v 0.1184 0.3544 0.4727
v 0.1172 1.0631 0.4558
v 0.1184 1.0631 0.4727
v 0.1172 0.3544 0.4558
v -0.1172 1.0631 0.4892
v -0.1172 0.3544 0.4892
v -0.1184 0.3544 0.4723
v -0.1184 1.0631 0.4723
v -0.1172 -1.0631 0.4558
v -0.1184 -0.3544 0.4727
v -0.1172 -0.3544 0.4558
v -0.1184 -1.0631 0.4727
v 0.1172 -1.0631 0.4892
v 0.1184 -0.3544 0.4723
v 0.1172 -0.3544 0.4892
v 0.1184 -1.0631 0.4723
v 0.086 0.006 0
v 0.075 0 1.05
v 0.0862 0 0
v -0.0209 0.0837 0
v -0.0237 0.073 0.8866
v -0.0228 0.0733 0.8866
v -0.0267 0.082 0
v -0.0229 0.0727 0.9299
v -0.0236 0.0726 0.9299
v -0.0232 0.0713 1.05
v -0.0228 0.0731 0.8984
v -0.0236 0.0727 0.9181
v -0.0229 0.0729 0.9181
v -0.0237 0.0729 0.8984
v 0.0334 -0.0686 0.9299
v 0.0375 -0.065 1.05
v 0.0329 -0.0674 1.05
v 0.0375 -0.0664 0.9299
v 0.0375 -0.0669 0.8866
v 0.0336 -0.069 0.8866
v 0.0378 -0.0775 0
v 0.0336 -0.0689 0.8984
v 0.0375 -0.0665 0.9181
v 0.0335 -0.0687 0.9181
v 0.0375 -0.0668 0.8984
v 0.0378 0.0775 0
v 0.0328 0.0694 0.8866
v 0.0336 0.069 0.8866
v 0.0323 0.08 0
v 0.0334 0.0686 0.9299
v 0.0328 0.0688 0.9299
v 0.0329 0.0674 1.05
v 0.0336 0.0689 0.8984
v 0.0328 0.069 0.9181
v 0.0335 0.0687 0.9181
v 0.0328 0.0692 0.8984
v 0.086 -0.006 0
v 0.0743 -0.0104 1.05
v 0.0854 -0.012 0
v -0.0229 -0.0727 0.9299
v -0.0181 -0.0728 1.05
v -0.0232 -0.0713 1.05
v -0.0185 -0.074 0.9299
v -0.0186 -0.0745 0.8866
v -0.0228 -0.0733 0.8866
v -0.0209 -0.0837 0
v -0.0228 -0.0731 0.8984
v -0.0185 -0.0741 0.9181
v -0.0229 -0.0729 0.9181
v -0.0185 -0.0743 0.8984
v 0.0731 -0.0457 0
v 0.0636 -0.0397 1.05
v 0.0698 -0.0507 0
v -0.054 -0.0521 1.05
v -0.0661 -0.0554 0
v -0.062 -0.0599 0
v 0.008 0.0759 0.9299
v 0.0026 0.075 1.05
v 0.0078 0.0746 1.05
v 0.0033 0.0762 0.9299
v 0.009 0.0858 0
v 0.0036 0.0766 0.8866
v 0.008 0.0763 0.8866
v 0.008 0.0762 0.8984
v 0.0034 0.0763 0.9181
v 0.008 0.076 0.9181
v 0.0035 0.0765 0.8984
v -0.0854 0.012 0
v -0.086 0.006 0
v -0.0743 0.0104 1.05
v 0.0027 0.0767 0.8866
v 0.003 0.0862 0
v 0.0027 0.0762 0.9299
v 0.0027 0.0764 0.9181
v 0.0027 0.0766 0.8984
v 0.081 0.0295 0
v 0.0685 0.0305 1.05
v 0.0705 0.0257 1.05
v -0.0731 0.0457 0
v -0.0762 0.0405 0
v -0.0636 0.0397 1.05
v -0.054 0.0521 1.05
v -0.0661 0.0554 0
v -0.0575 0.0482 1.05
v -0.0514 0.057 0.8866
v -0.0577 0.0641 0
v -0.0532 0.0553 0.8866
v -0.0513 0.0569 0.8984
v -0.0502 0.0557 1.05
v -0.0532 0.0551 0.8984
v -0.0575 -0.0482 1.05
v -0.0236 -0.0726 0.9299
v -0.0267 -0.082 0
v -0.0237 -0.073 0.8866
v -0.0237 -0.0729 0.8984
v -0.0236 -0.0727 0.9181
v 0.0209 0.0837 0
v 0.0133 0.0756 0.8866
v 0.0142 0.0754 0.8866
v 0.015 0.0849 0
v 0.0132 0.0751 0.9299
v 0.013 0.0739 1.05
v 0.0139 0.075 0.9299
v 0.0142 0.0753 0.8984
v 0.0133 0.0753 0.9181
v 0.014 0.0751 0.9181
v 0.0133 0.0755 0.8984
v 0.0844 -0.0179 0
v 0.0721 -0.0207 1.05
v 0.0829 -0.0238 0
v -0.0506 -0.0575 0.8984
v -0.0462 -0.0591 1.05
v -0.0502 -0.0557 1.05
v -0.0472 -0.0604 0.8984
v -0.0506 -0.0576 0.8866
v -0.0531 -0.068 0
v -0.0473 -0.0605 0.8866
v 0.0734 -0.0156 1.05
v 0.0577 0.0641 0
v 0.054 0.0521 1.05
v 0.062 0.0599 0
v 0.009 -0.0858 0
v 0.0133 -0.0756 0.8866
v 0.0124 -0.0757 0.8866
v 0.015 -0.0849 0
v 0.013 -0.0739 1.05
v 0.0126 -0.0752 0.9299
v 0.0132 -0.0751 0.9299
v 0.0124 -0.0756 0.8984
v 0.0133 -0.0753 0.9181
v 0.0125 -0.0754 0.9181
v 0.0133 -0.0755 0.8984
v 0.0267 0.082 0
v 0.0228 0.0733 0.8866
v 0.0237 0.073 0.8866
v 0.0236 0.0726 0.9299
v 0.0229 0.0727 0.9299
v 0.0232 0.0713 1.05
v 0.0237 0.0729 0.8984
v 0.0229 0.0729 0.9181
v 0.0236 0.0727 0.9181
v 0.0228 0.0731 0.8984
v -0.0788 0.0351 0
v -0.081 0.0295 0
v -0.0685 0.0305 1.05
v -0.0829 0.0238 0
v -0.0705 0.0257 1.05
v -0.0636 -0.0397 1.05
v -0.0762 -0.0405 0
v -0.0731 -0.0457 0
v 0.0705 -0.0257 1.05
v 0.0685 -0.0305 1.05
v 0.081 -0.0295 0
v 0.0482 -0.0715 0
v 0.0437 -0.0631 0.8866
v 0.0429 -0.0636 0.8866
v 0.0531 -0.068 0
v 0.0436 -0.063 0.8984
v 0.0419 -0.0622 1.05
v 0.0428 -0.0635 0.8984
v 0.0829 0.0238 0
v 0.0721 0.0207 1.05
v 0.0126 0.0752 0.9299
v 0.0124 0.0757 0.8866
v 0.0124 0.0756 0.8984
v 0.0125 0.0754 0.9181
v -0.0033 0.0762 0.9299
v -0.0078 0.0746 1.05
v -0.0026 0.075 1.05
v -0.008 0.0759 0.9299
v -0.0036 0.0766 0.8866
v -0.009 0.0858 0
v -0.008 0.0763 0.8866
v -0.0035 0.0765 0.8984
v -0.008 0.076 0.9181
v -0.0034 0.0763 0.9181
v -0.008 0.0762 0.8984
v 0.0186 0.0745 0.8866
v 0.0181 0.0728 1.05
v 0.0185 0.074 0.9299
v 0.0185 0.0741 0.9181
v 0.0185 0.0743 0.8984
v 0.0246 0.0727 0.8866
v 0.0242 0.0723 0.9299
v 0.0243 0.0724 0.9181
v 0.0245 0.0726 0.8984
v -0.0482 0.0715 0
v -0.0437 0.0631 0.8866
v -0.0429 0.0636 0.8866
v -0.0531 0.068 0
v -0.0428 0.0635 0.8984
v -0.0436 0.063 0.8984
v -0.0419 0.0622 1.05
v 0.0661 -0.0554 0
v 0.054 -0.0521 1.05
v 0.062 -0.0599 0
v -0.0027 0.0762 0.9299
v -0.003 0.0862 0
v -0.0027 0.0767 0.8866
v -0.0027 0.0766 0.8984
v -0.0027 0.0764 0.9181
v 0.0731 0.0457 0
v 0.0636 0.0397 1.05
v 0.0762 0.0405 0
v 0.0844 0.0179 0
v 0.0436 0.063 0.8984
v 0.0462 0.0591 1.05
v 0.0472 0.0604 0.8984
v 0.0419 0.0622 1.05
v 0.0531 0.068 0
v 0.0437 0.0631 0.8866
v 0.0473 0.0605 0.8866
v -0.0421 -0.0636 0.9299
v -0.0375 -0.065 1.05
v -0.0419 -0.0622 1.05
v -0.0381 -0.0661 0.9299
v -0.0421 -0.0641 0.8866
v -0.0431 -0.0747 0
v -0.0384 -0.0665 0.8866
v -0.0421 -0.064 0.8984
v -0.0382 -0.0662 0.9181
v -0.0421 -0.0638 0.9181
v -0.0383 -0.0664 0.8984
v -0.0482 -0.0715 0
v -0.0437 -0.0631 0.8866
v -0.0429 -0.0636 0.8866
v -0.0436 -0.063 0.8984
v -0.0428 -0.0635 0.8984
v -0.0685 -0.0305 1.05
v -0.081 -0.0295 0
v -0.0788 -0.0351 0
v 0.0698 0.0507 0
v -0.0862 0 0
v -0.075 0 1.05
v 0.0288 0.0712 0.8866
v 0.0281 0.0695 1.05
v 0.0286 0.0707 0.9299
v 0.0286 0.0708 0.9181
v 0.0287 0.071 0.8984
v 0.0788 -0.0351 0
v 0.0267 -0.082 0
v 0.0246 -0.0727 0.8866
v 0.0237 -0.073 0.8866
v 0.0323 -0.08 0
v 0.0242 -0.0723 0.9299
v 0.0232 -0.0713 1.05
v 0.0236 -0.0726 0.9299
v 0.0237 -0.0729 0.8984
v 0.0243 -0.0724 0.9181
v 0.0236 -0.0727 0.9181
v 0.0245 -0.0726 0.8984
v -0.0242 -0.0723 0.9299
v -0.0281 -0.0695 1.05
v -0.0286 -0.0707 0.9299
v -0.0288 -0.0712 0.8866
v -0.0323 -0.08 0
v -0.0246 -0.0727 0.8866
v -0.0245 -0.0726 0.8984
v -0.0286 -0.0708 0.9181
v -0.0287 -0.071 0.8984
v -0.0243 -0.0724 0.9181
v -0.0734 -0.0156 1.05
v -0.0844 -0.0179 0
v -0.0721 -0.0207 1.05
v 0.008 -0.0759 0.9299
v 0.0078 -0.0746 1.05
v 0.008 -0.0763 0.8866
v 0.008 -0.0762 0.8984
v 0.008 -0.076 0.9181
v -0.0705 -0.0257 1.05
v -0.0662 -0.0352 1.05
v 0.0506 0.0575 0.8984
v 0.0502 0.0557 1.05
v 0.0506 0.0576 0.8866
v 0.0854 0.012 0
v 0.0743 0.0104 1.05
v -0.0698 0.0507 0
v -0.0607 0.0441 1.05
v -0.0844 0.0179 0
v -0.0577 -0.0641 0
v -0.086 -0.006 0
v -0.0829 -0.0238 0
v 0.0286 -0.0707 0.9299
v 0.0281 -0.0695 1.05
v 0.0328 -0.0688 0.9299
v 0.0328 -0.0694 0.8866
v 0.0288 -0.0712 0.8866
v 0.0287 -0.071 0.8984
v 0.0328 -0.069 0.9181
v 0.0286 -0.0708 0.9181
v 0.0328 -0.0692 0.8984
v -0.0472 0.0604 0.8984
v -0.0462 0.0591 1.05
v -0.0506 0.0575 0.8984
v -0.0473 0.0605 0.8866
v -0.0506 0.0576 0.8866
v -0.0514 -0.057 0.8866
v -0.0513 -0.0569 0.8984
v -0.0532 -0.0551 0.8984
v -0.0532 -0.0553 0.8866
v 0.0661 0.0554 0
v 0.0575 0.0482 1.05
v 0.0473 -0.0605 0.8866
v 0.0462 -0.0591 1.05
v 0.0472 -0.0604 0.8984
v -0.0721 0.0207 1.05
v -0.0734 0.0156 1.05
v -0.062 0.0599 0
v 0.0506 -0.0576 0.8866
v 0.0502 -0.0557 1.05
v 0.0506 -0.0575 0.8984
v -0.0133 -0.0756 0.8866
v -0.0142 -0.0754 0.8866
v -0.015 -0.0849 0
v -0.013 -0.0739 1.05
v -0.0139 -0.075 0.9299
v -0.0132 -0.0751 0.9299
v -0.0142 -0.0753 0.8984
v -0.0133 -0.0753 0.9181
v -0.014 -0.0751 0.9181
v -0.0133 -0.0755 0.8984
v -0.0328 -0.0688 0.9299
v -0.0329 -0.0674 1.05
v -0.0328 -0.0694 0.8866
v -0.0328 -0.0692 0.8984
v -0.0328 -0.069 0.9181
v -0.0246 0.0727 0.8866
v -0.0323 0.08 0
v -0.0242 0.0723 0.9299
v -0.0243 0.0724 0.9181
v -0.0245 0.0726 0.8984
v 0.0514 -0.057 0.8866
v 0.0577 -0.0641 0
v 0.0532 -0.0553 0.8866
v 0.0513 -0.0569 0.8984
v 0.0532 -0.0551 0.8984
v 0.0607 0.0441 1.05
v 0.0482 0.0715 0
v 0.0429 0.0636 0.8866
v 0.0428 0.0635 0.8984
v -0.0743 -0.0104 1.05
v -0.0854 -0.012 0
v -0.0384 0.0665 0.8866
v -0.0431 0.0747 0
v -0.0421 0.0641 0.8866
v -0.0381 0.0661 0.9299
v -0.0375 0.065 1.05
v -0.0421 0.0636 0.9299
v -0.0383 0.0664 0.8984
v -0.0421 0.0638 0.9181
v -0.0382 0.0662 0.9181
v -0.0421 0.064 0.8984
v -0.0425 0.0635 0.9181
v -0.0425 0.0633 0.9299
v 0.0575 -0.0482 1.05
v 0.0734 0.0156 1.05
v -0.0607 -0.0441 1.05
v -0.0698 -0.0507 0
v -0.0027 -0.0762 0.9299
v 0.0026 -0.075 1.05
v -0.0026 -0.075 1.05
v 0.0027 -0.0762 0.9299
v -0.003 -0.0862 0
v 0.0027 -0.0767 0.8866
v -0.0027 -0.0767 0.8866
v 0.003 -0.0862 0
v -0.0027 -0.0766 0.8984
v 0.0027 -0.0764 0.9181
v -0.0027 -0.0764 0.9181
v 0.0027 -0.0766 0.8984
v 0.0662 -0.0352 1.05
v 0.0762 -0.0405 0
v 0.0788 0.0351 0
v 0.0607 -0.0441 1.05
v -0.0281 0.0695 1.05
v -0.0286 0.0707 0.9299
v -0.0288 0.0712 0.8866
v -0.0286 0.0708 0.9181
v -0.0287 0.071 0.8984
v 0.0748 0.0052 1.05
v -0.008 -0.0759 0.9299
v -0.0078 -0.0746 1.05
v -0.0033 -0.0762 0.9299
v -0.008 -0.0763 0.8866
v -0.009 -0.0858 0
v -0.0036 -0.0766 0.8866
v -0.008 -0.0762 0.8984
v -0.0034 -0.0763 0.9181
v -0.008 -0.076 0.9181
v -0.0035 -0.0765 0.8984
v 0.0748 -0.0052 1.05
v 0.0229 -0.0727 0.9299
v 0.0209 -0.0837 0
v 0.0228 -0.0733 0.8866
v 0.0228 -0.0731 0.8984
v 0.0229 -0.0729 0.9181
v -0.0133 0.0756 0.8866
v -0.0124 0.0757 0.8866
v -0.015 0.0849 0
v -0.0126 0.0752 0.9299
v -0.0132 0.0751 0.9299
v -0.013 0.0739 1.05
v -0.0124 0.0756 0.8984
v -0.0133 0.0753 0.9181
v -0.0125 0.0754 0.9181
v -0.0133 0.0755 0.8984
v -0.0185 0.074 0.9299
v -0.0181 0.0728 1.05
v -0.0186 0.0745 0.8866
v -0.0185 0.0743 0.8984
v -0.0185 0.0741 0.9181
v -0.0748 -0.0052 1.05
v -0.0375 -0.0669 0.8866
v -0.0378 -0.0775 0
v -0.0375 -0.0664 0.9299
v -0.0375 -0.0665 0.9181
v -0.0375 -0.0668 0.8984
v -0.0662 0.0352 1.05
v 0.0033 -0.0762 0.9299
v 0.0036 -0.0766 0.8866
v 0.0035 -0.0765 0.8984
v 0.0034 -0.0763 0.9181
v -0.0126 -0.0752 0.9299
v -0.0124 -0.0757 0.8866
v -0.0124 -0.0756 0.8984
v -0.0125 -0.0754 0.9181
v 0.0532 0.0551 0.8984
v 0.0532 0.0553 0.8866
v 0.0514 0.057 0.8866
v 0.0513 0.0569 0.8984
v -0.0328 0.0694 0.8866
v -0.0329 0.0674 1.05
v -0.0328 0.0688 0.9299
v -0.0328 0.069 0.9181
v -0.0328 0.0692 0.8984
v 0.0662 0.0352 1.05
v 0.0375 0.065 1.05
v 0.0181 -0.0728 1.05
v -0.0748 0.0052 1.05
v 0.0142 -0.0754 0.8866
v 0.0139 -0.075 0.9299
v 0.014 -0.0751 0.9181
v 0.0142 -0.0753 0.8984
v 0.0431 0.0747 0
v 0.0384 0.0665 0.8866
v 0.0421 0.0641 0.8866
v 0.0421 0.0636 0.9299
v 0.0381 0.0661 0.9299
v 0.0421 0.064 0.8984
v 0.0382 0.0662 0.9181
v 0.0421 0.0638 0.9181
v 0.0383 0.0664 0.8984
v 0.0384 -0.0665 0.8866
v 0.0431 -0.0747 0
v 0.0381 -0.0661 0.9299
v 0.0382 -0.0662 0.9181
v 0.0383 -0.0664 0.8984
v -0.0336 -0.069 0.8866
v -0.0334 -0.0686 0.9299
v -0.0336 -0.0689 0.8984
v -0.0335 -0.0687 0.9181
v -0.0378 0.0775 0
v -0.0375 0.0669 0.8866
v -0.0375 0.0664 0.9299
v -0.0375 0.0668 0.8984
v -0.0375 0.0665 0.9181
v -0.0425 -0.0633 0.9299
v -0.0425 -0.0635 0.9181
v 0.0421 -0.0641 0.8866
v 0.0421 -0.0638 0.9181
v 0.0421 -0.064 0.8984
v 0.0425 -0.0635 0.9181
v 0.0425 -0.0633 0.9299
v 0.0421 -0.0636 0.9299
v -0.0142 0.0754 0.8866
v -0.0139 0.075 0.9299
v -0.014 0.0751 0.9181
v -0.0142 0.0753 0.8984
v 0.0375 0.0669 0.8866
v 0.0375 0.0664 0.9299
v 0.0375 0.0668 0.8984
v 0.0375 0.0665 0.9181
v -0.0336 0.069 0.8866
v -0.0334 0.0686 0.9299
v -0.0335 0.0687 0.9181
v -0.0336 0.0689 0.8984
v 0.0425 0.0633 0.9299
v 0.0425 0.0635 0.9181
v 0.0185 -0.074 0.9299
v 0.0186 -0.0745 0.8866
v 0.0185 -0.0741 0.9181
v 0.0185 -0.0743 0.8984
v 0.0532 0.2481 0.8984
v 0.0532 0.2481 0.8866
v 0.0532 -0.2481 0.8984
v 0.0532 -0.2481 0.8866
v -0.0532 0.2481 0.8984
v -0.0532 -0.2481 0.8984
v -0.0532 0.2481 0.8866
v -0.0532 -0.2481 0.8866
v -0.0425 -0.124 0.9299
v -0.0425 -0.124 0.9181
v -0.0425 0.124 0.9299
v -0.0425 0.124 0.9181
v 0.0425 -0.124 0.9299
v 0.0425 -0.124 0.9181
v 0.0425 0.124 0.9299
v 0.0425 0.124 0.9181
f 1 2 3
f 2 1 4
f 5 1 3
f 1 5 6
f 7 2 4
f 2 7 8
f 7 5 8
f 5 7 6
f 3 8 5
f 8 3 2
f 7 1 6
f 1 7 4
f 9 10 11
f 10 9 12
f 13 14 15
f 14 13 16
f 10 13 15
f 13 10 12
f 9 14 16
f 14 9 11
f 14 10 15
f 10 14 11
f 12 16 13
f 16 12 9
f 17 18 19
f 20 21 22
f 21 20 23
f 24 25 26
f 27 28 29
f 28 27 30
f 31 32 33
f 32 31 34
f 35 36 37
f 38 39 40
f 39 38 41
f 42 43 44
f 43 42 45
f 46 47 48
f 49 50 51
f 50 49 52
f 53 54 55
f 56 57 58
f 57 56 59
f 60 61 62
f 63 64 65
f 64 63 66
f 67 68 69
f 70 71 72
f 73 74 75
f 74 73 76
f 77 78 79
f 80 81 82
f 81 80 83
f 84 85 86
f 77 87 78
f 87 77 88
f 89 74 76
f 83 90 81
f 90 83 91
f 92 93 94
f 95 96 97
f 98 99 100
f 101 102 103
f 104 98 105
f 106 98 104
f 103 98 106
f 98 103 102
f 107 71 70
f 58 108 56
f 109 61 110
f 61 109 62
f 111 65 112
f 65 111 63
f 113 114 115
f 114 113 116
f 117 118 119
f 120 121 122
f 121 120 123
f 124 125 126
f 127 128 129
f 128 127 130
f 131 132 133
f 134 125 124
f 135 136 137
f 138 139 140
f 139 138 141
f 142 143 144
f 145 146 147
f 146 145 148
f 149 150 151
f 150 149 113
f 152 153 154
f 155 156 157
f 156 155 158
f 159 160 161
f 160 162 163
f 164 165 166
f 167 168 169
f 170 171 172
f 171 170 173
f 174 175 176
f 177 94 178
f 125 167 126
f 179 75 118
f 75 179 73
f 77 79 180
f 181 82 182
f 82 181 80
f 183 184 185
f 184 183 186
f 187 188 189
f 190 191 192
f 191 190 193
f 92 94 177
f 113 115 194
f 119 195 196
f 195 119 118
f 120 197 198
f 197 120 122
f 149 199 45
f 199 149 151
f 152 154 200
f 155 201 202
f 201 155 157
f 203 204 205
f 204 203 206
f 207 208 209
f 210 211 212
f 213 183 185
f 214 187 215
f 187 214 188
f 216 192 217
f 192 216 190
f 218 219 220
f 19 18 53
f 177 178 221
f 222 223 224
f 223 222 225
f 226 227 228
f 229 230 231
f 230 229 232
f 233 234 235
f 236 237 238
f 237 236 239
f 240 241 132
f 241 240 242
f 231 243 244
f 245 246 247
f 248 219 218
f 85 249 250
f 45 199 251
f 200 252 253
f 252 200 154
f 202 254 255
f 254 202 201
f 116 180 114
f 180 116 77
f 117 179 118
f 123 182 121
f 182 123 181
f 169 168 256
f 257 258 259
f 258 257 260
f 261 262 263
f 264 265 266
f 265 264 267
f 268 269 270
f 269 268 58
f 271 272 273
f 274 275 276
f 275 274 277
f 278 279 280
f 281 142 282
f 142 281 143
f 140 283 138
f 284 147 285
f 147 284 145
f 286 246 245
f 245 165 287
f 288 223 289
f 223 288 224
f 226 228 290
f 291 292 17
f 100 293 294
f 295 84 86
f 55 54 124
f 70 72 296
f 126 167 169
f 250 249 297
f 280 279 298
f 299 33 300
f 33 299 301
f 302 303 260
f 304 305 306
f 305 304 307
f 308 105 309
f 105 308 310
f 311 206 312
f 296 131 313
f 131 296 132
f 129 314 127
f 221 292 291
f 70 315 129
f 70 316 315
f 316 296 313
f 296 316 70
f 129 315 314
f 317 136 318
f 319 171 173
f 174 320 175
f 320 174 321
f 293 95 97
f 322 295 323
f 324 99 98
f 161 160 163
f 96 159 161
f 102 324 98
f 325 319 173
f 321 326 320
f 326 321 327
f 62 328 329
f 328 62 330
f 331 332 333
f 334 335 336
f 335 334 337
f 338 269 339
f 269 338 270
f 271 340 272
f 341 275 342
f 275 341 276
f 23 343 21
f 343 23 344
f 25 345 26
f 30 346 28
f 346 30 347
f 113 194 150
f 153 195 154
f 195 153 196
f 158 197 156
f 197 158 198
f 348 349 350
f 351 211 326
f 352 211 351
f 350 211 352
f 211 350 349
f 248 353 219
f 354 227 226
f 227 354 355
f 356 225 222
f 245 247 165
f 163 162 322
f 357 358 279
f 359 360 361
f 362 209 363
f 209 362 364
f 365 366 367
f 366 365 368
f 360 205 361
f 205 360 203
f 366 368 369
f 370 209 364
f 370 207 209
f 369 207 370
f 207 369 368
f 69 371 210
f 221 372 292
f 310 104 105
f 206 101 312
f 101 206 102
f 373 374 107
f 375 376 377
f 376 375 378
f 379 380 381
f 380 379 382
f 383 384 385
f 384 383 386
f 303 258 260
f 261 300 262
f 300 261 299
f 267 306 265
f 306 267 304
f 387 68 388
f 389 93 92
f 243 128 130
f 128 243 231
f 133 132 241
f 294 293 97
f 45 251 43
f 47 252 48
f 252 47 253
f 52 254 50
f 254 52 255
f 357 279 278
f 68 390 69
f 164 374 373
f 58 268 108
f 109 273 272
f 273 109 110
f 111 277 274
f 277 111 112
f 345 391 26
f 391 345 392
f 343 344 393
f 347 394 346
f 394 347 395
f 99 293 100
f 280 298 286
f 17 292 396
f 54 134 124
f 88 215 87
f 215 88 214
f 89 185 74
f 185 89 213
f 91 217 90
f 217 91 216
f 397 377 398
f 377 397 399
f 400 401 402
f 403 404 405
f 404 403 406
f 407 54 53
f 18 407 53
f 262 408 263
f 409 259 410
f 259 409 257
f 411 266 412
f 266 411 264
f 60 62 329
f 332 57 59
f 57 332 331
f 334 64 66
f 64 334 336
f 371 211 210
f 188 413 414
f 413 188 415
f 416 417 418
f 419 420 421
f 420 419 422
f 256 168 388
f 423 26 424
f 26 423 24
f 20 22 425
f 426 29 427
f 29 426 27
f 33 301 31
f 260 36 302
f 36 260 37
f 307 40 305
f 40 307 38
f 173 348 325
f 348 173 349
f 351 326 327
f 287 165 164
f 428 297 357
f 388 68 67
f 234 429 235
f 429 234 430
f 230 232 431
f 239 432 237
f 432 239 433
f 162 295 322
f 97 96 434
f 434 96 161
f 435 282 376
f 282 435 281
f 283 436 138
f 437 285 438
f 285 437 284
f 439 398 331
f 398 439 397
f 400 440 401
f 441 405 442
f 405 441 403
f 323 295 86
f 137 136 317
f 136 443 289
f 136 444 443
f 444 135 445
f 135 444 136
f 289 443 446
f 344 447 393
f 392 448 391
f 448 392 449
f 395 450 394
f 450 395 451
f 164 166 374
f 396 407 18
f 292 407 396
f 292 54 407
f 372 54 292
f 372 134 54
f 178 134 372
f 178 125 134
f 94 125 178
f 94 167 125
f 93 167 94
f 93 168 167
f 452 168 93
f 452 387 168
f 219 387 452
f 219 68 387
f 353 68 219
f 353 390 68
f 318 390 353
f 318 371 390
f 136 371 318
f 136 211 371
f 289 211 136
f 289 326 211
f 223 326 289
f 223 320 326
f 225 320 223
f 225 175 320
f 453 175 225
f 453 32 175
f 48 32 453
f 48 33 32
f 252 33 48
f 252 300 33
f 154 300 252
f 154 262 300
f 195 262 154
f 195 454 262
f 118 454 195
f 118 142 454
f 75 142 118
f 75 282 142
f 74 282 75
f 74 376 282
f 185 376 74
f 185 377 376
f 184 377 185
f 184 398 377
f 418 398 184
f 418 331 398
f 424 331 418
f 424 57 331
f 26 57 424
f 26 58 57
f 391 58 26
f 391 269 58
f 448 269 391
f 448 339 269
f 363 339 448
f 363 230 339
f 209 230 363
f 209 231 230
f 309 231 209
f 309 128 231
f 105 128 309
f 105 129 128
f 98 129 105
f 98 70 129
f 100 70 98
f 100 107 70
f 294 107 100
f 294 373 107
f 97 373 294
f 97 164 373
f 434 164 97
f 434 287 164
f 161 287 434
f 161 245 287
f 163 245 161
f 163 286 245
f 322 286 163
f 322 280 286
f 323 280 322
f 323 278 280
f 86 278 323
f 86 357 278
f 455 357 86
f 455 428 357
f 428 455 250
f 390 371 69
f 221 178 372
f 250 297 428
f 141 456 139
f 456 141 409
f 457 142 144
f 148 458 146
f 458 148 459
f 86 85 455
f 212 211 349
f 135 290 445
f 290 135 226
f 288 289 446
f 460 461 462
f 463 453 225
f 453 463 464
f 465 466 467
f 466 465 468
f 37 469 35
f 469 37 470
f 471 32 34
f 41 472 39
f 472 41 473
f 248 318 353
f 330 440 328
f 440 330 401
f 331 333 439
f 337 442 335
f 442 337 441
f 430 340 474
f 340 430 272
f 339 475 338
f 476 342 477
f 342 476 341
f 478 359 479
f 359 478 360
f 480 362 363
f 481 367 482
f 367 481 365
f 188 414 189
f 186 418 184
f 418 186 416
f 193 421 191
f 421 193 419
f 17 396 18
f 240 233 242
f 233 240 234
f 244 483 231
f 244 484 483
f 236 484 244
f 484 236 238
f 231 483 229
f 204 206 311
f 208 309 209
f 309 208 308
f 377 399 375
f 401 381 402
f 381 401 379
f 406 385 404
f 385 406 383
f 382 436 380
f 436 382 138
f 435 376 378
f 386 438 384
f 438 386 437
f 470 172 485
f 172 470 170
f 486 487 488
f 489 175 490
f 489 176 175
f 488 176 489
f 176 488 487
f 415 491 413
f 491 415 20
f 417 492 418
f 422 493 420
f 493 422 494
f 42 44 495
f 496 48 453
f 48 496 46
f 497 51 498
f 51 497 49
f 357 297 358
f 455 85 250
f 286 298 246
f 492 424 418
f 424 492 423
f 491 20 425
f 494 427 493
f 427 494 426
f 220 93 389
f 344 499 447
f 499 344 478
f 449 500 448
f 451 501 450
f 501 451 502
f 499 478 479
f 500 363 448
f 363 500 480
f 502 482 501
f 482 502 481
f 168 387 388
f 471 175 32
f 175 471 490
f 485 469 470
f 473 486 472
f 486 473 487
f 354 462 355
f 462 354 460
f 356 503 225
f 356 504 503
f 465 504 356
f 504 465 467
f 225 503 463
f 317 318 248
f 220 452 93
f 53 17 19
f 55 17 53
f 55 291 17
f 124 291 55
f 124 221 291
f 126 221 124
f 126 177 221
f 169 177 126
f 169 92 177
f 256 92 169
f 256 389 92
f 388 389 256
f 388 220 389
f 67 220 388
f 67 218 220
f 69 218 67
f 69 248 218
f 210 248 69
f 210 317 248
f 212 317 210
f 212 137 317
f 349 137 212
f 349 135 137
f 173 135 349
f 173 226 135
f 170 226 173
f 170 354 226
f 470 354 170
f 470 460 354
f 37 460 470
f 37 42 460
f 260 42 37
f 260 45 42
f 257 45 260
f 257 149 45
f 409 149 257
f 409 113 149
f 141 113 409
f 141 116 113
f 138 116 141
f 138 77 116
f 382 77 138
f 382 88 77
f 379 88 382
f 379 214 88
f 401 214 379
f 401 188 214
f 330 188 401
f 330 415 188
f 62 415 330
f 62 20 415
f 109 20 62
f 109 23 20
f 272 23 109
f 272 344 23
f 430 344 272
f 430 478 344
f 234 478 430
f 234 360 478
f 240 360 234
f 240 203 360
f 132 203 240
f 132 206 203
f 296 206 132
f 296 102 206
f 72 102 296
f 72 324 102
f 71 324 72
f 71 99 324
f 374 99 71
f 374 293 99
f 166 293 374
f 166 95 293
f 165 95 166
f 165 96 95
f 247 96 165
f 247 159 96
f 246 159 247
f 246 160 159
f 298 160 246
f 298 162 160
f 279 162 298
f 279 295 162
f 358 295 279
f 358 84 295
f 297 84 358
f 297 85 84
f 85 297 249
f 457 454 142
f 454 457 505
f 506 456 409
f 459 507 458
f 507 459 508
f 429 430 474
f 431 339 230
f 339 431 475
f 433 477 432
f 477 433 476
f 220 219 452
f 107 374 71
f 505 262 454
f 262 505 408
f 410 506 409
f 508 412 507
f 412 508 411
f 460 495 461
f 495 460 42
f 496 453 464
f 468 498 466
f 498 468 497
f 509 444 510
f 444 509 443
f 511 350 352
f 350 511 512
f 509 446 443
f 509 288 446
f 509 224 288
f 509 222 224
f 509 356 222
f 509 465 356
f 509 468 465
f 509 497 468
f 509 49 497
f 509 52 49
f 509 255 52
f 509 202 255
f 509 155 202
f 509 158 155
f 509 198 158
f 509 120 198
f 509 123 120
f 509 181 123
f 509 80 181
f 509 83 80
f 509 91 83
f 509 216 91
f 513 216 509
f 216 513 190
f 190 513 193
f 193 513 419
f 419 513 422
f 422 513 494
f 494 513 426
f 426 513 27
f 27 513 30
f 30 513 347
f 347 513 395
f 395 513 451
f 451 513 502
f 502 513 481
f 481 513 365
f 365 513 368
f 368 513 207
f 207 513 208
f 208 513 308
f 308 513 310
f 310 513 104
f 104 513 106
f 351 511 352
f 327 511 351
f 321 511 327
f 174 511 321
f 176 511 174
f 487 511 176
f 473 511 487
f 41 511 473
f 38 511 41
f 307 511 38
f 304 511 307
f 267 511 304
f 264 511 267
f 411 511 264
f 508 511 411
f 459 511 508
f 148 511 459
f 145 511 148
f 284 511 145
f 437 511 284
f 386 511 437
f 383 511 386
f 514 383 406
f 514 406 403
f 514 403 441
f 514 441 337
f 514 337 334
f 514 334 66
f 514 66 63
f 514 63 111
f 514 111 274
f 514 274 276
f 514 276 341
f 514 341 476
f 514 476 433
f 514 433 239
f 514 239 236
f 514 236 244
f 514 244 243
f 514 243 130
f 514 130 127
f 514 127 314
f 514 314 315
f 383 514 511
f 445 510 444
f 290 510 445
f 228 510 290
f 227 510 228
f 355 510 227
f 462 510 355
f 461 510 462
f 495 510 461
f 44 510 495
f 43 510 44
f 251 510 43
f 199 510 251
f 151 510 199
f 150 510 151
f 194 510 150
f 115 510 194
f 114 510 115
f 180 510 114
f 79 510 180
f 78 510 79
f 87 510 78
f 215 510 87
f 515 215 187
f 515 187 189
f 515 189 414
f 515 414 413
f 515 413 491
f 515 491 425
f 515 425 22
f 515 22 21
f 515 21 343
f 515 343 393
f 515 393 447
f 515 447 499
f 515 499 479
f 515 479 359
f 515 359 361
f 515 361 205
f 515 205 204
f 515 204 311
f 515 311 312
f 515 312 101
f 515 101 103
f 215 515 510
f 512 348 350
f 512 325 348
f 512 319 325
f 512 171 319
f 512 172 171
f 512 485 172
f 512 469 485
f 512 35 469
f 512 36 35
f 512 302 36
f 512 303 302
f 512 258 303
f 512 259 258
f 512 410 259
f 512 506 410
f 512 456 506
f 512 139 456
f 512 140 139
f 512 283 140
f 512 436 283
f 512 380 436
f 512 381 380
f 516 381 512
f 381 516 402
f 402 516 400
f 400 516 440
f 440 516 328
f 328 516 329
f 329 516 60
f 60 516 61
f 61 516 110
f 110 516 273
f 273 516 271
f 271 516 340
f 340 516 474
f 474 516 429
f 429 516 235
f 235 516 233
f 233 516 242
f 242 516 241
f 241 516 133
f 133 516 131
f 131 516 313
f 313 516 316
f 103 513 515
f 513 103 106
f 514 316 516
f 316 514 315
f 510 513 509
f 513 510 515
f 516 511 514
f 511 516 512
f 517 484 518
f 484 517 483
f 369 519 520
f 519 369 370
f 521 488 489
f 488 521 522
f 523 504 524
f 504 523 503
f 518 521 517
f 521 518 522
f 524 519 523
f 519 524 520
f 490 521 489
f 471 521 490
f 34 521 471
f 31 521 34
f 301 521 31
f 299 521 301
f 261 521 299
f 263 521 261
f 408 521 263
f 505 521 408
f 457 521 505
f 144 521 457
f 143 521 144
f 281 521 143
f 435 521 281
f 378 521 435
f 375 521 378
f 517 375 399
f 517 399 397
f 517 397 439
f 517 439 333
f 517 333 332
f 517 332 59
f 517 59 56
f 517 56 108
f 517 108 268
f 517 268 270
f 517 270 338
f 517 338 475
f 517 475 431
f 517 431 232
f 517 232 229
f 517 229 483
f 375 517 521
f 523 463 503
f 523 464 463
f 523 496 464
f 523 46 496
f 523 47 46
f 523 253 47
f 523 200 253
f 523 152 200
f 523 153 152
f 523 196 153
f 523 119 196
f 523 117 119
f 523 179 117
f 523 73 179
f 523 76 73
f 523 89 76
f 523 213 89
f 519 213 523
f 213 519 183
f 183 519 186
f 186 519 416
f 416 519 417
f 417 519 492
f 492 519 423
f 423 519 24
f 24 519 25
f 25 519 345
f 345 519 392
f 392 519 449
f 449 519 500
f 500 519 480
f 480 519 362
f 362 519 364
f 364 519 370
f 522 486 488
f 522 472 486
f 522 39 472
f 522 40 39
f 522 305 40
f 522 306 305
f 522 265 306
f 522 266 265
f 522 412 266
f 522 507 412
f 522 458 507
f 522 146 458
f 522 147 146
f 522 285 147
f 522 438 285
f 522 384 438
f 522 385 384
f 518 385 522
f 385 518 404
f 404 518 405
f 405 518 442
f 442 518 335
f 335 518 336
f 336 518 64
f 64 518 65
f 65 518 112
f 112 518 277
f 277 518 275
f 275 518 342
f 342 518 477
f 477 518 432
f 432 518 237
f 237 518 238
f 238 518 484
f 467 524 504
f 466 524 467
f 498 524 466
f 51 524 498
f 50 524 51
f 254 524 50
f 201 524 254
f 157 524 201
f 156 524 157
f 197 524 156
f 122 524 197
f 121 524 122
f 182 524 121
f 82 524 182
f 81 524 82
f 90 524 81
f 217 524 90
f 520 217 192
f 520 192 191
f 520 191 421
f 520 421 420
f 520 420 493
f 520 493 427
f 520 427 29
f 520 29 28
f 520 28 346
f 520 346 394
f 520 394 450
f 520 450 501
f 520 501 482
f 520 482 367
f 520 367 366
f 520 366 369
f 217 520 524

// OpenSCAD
// ==========================================
// GENERATED AIRCRAFT VARIANT 0
// ==========================================

$fn = 90;

// --------- FUSELAGE ----------
module fuselage() {
    cylinder(h=1.05,
             r1=0.08625,
             r2=0.075,
             center=false);
}

// --------- WING ----------
module wing_half(sign=1) {
    rotate([0, 4*sign, 0])
    translate([0, sign*0.7087500000000001, 0])
    cube([0.23625000000000004,
          0.7087500000000001,
          0.016875000000000005],
          center=true);
}

module wing() {
    wing_half(1);
    wing_half(-1);
}

// --------- TAIL ----------
module tail() {
    translate([0, 0, 0.8925])
    cube([0.10631250000000002,
          0.49612500000000004,
          0.011812500000000002],
          center=true);
}

module vertical_tail() {
    translate([0, 0, 0.924])
    rotate([90,0,0])
    cube([0.08505000000000001,
          0.011812500000000002,
          0.24806250000000002],
          center=true);
}

union() {
    fuselage();
    translate([0,0,0.47250000000000003]) wing();
    tail();
    vertical_tail();
}
